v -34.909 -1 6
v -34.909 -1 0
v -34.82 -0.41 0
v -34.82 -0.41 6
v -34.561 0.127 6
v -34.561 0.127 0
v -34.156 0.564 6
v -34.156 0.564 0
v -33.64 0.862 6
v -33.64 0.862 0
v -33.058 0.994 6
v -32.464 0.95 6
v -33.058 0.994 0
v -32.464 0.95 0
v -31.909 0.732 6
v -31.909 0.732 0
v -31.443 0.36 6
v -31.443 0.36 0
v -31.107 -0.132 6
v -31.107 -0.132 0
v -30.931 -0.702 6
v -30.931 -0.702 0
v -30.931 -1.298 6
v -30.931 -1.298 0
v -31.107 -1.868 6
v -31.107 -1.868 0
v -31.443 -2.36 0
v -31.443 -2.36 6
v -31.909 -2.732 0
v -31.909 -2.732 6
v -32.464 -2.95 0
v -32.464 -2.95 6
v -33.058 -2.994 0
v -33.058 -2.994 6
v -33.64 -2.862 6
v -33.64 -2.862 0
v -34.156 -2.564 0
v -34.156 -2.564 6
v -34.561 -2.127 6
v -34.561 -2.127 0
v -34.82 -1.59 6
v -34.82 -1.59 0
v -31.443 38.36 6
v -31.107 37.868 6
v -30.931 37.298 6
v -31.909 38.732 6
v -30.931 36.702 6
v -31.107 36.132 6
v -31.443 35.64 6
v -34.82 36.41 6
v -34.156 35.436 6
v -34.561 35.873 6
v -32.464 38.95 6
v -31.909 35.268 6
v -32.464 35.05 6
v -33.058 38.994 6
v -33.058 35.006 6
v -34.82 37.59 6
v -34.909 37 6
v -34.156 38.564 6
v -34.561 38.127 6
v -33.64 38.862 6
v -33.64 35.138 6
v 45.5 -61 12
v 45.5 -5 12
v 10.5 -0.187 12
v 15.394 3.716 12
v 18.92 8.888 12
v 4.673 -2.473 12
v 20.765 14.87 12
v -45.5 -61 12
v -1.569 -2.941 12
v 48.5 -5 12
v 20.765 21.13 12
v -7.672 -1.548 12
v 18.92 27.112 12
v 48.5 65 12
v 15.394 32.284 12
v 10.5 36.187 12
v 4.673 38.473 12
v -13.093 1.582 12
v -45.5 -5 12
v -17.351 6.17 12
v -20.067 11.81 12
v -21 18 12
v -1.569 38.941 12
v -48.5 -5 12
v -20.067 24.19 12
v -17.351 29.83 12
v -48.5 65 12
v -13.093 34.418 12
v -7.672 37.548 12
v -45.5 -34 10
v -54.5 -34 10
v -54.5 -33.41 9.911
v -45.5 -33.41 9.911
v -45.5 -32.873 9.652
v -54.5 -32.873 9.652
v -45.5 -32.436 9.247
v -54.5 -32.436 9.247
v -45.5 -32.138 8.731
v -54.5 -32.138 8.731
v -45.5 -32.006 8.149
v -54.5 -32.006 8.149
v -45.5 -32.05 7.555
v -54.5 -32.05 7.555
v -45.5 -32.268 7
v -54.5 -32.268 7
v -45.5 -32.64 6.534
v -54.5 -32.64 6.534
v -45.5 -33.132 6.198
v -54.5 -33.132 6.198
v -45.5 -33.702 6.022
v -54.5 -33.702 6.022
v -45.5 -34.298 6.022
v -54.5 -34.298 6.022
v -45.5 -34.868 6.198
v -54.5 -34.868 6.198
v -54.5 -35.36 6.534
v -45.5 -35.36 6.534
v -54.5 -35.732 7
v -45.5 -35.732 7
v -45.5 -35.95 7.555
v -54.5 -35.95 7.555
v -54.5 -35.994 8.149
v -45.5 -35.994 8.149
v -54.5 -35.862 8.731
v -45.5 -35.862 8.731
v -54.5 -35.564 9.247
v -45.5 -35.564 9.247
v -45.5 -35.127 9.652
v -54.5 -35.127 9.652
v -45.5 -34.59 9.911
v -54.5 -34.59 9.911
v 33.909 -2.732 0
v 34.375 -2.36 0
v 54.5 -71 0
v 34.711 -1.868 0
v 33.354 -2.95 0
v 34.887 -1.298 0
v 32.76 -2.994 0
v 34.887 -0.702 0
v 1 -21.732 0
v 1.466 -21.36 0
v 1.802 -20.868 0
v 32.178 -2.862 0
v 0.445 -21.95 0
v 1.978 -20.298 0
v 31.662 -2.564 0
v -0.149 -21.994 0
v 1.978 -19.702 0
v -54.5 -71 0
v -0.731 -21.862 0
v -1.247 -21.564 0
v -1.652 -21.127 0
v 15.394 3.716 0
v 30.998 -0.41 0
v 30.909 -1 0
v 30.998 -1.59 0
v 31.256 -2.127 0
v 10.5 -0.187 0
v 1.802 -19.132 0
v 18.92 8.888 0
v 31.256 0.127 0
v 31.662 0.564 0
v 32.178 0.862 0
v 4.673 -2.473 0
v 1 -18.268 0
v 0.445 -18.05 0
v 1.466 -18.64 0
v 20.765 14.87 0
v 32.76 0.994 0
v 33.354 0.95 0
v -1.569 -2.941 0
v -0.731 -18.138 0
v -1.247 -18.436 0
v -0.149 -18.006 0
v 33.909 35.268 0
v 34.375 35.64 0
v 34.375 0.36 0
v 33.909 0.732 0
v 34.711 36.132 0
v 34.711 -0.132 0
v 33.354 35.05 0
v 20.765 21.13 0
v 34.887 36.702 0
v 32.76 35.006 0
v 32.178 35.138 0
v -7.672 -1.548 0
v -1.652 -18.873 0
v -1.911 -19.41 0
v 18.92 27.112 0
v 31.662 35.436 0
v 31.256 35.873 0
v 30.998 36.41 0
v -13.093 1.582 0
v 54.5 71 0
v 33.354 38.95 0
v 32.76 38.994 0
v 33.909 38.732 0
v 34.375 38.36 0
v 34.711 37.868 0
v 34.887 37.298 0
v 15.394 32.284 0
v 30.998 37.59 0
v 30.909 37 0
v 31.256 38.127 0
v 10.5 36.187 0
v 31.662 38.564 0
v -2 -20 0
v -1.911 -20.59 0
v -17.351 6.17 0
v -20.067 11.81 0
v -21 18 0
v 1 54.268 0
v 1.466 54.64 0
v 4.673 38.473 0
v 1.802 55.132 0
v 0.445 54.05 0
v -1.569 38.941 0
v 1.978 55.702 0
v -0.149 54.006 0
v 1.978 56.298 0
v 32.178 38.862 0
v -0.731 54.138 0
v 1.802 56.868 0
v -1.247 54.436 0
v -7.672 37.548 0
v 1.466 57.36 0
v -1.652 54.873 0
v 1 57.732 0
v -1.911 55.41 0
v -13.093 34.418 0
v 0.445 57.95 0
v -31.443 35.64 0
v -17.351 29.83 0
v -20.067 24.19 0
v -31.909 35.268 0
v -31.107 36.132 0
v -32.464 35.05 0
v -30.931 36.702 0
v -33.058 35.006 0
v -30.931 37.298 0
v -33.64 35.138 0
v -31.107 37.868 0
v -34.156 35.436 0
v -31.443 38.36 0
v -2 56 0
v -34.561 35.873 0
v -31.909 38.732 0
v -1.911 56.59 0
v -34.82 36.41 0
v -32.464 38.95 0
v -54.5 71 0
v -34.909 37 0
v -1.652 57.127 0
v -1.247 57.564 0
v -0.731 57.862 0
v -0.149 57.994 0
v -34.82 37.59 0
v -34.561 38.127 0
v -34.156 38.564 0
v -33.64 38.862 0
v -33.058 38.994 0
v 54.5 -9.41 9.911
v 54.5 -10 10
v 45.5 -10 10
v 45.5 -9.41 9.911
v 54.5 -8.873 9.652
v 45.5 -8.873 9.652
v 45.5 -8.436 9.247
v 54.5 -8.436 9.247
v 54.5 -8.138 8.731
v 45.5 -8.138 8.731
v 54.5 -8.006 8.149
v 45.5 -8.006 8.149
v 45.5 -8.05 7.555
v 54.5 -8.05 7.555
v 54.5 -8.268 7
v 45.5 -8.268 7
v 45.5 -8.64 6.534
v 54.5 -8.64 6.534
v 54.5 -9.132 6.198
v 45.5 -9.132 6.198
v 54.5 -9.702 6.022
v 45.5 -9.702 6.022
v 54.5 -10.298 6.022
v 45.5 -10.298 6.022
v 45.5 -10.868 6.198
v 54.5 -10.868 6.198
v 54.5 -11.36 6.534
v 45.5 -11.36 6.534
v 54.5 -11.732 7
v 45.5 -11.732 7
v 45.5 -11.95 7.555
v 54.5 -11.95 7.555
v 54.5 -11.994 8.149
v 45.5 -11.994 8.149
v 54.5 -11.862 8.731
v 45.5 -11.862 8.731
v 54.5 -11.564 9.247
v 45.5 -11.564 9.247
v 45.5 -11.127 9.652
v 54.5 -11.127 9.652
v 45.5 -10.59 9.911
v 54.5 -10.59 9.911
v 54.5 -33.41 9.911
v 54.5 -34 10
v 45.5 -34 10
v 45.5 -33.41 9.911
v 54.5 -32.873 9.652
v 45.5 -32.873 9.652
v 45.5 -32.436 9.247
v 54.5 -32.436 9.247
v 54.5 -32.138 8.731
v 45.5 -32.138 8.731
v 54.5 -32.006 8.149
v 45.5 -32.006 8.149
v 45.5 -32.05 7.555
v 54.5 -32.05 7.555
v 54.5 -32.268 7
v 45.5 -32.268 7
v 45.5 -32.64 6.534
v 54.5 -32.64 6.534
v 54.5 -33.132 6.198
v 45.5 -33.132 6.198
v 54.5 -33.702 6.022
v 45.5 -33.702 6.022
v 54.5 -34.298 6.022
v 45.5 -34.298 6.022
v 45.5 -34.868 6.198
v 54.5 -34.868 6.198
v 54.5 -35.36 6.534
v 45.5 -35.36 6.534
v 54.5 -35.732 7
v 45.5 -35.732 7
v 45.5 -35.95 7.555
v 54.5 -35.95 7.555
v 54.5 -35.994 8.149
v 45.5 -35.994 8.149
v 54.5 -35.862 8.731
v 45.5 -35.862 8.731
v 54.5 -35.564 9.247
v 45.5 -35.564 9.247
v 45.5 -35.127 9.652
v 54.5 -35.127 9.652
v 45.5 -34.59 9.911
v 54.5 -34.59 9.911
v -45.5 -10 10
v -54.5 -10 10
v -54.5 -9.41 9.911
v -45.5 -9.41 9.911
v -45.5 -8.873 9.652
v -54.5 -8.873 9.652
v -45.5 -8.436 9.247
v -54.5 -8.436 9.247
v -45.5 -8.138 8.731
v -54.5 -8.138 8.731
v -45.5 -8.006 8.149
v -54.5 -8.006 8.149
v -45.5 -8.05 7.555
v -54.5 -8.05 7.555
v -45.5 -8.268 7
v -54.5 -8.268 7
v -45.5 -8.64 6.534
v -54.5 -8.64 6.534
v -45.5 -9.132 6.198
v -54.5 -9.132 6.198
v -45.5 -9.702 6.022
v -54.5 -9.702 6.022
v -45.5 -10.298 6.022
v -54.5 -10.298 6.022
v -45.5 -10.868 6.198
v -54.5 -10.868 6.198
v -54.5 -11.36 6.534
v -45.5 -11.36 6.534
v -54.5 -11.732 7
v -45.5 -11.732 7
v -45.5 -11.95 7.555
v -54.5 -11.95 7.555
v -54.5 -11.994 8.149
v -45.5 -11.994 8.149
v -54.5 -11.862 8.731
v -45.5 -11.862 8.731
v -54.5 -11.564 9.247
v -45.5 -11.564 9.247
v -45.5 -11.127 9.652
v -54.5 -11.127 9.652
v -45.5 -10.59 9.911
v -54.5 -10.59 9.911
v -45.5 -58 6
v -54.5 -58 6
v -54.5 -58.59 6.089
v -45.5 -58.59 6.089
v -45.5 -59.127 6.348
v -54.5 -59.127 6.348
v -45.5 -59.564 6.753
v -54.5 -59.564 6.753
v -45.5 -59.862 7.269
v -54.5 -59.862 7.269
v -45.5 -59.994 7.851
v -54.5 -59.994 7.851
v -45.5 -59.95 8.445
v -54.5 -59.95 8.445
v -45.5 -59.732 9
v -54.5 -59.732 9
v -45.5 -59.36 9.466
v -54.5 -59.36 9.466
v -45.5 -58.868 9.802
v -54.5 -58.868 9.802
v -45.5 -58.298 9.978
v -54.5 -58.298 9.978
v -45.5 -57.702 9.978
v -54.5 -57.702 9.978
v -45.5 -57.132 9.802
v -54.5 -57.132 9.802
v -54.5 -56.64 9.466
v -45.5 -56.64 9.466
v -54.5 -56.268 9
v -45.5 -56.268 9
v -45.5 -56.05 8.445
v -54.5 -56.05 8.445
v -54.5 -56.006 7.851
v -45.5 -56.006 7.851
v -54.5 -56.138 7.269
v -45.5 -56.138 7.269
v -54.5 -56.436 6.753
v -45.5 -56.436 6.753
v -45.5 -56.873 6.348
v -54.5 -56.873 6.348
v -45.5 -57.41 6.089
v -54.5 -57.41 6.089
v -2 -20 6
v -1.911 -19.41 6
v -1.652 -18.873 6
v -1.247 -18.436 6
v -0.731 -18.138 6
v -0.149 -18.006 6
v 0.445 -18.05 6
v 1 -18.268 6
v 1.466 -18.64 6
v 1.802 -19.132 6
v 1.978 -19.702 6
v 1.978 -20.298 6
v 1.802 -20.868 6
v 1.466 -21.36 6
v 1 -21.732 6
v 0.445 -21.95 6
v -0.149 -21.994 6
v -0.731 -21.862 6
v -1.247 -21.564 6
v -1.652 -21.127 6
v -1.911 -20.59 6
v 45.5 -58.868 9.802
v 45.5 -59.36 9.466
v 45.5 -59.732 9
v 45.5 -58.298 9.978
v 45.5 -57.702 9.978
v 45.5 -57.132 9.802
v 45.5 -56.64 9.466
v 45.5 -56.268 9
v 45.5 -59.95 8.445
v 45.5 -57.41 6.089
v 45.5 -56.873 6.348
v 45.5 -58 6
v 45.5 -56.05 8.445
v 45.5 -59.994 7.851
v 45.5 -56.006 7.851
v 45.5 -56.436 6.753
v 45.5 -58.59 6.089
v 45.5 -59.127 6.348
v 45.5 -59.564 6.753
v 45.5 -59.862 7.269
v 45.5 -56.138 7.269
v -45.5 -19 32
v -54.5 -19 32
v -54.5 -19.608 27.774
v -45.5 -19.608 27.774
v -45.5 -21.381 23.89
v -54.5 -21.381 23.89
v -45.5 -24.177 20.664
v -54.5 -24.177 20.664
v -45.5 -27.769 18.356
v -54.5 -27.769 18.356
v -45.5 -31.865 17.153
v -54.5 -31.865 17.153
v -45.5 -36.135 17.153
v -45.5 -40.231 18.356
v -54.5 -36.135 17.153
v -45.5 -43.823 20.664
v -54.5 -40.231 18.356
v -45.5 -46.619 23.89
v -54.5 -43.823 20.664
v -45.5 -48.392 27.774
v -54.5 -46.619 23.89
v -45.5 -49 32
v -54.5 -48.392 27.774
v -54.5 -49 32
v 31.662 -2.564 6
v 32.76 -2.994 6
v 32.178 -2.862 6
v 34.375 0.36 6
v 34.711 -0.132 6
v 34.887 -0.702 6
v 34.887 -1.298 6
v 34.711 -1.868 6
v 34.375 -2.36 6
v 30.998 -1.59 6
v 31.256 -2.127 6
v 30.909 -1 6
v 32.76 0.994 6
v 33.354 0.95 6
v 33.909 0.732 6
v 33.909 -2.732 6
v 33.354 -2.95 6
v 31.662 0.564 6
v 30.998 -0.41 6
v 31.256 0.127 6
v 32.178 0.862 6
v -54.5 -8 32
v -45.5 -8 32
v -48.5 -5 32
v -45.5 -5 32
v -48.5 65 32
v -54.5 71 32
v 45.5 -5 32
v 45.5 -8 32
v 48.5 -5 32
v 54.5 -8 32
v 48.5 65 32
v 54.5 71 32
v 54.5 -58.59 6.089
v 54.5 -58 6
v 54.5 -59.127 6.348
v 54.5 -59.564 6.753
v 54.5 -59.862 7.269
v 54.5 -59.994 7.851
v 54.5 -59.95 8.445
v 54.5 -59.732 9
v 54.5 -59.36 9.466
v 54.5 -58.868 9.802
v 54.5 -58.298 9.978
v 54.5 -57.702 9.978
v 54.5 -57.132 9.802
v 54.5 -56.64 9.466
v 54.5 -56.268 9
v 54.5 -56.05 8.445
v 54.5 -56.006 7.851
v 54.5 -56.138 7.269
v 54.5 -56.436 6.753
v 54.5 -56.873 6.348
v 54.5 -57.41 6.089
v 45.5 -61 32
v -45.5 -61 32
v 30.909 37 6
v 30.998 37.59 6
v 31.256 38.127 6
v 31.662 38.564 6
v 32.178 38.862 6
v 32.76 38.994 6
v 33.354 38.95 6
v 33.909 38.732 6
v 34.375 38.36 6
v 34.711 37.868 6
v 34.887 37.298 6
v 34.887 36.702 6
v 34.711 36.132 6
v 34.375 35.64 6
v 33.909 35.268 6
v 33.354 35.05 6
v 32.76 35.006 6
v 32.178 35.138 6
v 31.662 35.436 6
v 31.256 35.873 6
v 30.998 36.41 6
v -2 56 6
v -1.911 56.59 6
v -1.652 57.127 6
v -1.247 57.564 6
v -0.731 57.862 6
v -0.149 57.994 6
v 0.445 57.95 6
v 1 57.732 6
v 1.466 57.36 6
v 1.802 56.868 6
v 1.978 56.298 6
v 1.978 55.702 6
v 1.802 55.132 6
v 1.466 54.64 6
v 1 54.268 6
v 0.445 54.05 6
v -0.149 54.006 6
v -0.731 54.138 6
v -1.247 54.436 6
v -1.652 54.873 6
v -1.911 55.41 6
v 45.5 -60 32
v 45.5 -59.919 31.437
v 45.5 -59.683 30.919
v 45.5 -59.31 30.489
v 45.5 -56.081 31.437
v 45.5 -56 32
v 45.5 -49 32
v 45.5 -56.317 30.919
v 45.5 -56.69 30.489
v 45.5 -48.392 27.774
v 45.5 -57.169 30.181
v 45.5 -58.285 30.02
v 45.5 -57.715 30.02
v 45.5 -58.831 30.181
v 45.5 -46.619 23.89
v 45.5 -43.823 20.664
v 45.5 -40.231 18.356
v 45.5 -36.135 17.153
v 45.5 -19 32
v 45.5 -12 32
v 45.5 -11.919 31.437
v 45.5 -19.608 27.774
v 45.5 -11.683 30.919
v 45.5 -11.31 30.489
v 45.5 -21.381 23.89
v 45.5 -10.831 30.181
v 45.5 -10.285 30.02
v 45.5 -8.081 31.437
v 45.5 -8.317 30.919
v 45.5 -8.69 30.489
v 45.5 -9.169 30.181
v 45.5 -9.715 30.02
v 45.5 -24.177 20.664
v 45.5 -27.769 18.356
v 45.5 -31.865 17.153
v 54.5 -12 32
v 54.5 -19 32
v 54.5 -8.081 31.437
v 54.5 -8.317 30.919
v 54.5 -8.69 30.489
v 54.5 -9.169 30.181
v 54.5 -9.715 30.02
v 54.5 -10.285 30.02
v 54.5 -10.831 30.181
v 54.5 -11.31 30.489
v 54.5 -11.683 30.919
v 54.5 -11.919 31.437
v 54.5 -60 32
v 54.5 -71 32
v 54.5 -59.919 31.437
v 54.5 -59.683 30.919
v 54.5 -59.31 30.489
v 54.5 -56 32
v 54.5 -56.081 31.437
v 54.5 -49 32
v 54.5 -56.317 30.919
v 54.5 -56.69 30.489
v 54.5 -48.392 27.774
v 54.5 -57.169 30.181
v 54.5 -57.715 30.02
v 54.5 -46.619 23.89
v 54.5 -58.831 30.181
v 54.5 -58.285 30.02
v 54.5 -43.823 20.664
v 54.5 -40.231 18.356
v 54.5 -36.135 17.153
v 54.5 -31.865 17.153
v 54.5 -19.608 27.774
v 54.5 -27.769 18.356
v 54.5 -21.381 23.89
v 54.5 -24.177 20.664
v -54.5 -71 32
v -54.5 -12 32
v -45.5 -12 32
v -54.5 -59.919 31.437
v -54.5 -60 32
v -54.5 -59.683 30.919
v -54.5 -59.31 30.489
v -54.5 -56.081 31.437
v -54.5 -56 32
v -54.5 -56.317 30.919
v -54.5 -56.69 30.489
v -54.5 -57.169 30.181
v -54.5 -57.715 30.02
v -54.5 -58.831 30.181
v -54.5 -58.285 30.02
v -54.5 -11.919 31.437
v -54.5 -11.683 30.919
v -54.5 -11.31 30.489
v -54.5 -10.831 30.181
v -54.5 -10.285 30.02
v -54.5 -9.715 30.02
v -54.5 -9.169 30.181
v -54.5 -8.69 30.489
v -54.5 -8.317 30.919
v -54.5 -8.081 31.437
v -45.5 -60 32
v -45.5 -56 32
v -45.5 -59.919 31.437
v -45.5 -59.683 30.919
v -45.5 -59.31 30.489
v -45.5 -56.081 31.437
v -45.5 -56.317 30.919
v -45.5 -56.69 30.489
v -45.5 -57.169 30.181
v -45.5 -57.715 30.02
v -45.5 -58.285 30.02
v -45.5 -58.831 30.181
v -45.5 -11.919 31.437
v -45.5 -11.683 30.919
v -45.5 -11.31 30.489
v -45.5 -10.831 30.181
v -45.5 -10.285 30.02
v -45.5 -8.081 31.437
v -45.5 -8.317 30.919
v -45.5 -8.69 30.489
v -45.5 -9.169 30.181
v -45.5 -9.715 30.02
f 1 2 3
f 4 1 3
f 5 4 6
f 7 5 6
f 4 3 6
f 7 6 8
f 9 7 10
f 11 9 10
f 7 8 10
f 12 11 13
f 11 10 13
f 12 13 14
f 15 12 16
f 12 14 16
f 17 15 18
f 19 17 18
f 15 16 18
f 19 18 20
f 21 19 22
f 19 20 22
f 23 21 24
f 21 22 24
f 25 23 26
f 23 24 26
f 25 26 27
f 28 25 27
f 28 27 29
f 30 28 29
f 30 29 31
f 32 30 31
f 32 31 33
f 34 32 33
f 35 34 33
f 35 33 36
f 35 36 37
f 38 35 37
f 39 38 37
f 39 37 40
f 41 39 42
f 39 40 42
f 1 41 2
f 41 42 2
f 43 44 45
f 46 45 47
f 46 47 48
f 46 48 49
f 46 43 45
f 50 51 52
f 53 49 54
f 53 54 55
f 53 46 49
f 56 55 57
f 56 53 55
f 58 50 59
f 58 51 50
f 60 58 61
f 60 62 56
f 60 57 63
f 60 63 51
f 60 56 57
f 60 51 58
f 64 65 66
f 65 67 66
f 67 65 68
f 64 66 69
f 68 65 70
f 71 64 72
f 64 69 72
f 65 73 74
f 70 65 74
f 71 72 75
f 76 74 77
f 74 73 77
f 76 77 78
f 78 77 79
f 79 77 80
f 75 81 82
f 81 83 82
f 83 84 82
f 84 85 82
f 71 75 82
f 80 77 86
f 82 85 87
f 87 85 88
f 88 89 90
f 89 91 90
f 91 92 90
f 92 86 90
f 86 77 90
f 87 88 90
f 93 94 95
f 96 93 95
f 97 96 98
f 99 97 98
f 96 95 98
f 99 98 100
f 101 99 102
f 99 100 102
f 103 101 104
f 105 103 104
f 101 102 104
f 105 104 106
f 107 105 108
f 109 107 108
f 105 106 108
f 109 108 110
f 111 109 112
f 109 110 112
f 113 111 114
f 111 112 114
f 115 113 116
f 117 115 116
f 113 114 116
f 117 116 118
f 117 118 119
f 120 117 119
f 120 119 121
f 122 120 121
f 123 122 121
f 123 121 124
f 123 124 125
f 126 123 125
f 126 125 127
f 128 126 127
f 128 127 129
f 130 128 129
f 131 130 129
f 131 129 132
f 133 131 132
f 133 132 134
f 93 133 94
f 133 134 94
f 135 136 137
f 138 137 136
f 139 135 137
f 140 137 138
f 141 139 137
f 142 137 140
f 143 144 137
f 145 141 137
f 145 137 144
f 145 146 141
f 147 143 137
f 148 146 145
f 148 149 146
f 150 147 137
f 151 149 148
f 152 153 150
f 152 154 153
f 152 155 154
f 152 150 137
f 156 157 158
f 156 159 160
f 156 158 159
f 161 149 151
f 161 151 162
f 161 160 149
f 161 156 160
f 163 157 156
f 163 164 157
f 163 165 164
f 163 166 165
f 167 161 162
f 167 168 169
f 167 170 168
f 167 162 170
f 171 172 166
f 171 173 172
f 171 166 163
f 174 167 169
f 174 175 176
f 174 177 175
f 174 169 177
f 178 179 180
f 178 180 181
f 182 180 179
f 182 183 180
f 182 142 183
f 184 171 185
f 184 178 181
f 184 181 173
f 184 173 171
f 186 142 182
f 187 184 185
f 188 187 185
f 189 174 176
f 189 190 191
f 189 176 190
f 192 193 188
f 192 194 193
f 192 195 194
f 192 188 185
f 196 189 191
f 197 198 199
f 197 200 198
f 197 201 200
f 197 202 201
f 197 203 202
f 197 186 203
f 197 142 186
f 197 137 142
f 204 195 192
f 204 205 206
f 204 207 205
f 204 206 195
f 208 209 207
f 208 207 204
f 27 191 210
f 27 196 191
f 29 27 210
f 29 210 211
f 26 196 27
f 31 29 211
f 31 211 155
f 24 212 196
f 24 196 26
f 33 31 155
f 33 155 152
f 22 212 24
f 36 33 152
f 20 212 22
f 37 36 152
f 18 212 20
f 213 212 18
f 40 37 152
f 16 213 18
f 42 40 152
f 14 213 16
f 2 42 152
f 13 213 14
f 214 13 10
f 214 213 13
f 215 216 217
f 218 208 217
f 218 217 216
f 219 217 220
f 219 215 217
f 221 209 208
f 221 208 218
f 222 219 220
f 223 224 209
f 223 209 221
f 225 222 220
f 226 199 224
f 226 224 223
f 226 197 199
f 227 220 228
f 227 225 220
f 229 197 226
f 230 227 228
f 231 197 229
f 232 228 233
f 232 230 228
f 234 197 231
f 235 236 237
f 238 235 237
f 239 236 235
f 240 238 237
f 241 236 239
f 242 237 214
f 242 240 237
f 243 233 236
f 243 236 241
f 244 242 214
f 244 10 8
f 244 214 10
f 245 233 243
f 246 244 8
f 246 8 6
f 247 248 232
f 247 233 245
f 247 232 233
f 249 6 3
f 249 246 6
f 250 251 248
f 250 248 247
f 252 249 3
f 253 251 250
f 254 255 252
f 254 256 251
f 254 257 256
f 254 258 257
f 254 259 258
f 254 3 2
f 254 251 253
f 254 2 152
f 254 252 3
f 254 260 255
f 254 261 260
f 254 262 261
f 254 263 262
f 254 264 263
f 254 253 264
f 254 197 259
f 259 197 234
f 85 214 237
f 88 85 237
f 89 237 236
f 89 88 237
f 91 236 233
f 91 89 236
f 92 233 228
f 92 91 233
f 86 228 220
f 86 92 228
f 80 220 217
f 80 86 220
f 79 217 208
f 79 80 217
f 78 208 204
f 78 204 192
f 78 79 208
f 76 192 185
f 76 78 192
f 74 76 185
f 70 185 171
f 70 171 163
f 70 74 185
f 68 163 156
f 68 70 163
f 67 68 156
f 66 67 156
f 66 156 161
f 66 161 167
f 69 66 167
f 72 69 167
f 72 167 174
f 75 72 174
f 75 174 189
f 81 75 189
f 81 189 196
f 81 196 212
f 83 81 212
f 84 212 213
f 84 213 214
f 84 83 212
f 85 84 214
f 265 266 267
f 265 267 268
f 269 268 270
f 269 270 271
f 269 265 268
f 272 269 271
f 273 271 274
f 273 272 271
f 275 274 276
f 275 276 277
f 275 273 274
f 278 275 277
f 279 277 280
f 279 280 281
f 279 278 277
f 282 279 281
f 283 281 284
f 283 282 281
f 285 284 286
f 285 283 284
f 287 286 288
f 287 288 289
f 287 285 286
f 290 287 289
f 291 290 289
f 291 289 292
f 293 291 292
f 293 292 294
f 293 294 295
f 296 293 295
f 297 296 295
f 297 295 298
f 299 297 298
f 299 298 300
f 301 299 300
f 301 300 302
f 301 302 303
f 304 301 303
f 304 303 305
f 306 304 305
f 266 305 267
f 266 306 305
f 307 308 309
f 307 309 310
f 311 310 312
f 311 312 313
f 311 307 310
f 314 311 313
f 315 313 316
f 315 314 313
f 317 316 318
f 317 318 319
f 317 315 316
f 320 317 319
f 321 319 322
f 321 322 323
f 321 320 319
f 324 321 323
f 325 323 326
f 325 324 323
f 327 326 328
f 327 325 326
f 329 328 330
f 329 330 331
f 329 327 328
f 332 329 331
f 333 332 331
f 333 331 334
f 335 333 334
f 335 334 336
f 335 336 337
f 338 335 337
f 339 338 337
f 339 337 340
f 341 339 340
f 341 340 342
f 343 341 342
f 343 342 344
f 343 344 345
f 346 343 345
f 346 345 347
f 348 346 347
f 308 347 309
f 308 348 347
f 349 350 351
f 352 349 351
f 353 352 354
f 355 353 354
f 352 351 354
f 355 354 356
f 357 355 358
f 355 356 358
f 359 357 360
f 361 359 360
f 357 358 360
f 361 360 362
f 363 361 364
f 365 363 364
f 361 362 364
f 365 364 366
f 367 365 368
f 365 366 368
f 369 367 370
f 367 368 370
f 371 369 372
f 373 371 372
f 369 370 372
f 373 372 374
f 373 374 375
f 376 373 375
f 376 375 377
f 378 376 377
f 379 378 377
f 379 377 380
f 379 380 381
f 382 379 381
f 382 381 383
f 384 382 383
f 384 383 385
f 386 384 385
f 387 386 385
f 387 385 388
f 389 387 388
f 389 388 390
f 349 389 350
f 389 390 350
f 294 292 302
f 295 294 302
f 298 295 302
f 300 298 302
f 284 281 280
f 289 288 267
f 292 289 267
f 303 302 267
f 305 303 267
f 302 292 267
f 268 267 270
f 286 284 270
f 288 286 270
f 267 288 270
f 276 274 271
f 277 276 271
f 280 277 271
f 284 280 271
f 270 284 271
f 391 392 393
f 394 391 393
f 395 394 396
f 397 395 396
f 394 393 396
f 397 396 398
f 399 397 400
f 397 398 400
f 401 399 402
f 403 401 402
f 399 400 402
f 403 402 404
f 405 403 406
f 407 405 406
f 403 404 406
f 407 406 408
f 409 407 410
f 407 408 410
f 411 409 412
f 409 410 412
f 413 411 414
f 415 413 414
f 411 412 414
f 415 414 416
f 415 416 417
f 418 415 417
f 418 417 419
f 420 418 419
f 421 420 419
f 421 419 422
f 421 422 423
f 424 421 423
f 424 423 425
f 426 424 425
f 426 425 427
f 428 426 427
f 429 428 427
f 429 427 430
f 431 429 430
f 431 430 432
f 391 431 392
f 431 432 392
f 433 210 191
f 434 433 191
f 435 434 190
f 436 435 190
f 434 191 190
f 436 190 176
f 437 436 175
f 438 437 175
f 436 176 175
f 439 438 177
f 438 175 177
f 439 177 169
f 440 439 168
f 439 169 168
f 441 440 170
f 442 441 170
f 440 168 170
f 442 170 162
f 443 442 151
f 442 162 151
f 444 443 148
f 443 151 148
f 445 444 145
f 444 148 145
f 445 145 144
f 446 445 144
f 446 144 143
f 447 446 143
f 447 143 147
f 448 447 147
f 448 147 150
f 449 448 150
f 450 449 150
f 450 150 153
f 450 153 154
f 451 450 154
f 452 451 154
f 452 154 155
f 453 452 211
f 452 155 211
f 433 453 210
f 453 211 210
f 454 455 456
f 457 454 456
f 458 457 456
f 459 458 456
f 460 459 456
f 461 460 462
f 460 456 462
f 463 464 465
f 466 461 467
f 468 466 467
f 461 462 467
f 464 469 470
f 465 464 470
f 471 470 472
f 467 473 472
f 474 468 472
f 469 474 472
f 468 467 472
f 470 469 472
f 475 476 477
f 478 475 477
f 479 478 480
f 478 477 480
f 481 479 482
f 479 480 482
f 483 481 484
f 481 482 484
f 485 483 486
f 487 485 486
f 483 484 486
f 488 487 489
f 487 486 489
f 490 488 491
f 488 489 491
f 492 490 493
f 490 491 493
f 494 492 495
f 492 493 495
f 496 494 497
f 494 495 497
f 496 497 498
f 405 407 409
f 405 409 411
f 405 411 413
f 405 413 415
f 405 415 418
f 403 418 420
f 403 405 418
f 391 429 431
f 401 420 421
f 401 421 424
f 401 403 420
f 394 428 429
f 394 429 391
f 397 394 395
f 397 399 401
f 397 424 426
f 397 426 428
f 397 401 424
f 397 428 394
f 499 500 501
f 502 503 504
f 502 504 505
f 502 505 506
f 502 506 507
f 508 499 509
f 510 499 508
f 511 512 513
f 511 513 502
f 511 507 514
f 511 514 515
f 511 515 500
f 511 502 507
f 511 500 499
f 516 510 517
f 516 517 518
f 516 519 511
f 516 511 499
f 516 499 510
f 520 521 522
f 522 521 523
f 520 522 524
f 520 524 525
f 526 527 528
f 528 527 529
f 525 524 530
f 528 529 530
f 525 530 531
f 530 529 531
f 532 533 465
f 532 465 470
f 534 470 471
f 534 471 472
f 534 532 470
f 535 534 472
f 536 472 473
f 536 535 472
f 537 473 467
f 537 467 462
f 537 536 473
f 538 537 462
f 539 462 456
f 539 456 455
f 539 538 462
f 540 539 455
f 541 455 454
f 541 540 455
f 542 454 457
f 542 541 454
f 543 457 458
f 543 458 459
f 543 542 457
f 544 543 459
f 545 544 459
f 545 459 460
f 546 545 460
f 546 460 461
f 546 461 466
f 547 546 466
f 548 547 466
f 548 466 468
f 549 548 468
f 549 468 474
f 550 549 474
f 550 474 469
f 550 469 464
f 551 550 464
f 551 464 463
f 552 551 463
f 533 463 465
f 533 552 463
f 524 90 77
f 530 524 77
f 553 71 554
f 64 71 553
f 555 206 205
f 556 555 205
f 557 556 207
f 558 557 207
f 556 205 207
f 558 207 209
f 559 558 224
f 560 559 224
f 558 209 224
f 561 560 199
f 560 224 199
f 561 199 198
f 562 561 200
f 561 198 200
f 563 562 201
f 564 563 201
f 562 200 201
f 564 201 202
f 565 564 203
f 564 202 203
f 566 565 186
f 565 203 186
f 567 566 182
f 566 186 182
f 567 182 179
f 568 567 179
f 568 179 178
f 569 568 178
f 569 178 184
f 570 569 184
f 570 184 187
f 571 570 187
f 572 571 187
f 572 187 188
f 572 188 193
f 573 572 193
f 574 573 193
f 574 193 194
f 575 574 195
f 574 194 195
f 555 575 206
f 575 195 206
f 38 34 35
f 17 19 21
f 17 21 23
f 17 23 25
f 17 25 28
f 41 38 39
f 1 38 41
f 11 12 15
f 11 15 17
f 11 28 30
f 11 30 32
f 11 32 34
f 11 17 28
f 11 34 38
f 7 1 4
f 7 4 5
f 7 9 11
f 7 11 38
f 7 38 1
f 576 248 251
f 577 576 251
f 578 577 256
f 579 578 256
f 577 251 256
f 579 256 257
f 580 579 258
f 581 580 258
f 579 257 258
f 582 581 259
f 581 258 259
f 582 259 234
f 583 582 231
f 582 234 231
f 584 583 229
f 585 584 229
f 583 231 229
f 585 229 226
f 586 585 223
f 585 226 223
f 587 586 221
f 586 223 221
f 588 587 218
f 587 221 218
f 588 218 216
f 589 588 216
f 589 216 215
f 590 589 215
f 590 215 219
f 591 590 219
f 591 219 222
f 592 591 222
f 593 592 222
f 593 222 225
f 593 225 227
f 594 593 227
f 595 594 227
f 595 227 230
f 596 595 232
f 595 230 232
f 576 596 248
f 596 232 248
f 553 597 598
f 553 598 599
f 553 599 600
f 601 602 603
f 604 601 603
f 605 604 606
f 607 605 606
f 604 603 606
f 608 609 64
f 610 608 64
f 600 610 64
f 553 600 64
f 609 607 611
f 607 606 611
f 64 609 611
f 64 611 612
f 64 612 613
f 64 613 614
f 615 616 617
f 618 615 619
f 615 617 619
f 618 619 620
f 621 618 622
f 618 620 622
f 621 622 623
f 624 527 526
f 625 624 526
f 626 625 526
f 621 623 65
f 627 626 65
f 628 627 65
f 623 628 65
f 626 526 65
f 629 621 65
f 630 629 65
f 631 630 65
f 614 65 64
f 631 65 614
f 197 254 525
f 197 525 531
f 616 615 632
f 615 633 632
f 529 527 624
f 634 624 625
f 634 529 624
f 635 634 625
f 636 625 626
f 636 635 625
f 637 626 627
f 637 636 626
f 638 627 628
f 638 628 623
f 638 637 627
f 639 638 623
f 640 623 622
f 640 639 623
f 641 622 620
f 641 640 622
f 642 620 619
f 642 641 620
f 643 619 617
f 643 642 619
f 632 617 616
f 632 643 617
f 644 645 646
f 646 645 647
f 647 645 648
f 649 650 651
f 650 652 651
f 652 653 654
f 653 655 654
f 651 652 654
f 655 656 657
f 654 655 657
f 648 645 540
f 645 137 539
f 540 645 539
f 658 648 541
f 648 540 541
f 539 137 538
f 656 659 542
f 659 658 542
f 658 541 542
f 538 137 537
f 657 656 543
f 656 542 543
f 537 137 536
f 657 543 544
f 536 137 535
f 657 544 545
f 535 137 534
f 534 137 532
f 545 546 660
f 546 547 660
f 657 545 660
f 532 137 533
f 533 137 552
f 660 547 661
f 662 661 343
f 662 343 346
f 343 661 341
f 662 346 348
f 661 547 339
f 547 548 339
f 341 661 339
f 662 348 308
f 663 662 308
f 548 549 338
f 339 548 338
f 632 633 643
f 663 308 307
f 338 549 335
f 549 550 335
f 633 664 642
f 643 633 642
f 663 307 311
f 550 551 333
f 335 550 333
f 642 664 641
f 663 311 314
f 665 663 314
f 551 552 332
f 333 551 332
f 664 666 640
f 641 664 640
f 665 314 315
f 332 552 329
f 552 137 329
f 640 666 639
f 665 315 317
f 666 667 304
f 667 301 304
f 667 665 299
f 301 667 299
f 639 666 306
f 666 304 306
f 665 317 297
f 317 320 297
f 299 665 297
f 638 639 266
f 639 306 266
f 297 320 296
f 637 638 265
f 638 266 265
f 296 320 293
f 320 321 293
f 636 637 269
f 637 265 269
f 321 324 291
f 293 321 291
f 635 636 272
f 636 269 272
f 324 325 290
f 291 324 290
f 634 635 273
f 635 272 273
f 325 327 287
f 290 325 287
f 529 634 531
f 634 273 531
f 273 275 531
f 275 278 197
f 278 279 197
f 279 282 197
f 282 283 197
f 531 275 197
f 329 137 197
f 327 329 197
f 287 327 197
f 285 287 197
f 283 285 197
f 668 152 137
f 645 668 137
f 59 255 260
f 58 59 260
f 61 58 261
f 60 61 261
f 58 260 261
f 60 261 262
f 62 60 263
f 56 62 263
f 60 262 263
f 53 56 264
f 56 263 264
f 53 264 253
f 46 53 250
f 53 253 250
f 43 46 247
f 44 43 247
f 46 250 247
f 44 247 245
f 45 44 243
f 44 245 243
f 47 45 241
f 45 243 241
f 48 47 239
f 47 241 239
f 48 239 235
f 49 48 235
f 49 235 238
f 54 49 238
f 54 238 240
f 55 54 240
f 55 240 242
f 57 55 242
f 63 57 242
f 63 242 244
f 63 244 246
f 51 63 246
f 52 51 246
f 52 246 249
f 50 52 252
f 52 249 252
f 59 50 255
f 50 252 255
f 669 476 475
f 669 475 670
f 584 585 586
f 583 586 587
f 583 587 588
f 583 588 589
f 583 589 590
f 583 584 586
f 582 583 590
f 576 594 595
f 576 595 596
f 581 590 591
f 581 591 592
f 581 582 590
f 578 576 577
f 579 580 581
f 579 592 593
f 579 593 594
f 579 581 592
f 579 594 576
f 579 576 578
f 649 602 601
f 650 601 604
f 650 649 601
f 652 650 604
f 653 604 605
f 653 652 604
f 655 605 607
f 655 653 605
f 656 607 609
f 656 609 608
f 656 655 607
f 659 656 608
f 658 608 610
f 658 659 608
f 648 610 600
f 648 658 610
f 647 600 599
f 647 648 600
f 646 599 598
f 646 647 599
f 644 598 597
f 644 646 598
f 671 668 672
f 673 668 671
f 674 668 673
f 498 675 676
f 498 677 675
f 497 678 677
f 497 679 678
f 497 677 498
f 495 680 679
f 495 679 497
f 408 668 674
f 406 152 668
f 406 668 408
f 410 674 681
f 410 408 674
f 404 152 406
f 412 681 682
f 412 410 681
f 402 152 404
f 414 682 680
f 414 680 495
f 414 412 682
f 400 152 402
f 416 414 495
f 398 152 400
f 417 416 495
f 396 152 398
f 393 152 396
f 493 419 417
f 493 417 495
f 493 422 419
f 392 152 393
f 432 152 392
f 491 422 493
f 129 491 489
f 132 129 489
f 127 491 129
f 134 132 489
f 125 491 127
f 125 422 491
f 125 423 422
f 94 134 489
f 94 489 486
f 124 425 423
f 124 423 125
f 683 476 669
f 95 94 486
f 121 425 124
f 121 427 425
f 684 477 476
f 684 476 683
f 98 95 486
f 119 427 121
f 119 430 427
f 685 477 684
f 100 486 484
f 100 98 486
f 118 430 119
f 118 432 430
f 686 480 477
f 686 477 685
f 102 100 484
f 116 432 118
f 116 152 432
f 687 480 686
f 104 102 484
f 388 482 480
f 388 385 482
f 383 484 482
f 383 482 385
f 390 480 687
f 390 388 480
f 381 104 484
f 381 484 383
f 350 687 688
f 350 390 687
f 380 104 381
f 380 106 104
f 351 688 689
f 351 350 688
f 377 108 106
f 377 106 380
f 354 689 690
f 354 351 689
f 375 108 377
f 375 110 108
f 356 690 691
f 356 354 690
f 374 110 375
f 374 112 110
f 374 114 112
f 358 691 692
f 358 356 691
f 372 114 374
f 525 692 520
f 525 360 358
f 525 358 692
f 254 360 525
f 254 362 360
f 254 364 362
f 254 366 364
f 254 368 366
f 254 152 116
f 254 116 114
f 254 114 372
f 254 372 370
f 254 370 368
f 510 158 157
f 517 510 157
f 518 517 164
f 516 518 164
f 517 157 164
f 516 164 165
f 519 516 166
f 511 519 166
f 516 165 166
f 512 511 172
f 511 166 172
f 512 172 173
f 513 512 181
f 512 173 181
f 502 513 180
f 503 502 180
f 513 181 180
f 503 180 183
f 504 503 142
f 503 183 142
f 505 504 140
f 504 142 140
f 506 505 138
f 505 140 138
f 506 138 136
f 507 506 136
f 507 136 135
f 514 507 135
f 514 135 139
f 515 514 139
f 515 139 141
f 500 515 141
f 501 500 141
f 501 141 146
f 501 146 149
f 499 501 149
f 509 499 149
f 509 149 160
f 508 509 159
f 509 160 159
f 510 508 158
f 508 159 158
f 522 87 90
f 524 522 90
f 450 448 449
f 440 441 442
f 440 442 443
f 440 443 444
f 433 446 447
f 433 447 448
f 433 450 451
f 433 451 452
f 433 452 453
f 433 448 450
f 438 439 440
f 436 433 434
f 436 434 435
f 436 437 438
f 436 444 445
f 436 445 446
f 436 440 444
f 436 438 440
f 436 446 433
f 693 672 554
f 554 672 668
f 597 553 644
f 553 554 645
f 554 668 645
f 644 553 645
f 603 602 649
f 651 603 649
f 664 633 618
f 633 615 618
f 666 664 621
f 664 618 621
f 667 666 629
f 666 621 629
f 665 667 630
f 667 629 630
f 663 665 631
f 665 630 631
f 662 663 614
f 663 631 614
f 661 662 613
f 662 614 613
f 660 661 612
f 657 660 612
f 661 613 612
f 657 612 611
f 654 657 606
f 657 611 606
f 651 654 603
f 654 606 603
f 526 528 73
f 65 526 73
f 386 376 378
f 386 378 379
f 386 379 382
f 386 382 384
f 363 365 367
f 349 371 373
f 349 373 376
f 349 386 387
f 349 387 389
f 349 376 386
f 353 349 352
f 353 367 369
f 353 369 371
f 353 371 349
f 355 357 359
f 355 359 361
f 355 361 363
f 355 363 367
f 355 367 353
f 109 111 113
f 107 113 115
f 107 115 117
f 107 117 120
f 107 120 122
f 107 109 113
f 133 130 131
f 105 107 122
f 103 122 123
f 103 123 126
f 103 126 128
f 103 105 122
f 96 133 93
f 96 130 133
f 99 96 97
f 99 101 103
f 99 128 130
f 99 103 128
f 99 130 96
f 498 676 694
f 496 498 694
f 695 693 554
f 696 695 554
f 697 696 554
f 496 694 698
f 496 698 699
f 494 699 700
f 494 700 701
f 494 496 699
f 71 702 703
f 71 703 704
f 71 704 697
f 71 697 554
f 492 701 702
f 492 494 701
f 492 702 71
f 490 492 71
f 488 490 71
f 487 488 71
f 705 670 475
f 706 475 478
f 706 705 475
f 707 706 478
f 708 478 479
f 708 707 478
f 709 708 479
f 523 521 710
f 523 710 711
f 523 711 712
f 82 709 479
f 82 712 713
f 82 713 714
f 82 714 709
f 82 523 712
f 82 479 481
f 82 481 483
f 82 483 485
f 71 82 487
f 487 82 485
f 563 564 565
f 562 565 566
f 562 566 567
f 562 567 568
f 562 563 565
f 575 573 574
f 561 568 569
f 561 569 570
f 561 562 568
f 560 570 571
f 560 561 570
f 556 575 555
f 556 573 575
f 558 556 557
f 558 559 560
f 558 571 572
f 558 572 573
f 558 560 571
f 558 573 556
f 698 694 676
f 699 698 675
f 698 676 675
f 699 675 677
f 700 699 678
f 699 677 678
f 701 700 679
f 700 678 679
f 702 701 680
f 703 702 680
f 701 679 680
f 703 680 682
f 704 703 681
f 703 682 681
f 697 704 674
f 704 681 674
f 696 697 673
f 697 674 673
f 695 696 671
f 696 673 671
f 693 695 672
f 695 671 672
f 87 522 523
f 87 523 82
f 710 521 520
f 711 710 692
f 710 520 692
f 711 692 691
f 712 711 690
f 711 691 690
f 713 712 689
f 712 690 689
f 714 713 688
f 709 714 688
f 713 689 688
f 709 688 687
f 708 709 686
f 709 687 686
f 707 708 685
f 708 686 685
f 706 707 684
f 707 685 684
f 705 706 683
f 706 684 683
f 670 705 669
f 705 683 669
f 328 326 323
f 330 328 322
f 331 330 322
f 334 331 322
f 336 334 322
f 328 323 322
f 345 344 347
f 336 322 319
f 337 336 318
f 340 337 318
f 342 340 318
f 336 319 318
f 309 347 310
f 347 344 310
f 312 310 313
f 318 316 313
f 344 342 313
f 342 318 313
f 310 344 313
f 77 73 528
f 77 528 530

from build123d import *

# Parameters (mm, degrees)
SKETCH1_W           = 97
SKETCH1_H           = 130
BOSS_EXTRUDE1_DEPTH = 12
SKETCH9_R           = 32
CUT_EXTRUDE2_DEPTH  = 12
SKETCH11_W          = 109
SKETCH11_H          = 142
SKETCH11_W_2        = 97
SKETCH11_H_2        = 130
BOSS_EXTRUDE4_DEPTH = 32
SKETCH18_W          = 20
SKETCH18_H          = 60
BOSS_EXTRUDE5_DEPTH = 3
SKETCH14_R          = 15
CUT_EXTRUDE5_DEPTH  = 134.962681371
SKETCH20_W          = 91
SKETCH20_H          = 20
BOSS_EXTRUDE6_DEPTH = 4
SKETCH21_R          = 2
CUT_EXTRUDE6_DEPTH  = 9
SKETCH23_R          = 2
CUT_EXTRUDE7_DEPTH  = 6
BOSS_EXTRUDE7_START = -12
SKETCH26_R          = 32
SKETCH26_R_2        = 21
BOSS_EXTRUDE7_DEPTH = 12


with BuildPart() as part:
    # Sketch1 → Boss-Extrude1 (new body)
    with BuildSketch(Plane.XY):
        Rectangle(SKETCH1_W, SKETCH1_H)
    extrude(amount=BOSS_EXTRUDE1_DEPTH)

    # Sketch9 → Cut-Extrude2 (cut)
    with BuildSketch(Plane.XY.offset(12)):
        with Locations((0, 18)):
            Circle(SKETCH9_R)
    extrude(amount=-CUT_EXTRUDE2_DEPTH, mode=Mode.SUBTRACT)

    # Sketch11 → Boss-Extrude4 (add)
    with BuildSketch(Plane.XY):
        Rectangle(SKETCH11_W, SKETCH11_H)
        Rectangle(SKETCH11_W_2, SKETCH11_H_2, mode=Mode.SUBTRACT)
    extrude(amount=BOSS_EXTRUDE4_DEPTH)

    # Sketch18 → Boss-Extrude5 (add)
    with BuildSketch(Plane(origin=(-48.5, 0, 0), x_dir=(0, 0, -1), z_dir=(1, 0, 0))):
        with Locations((-22, -35)):
            Rectangle(SKETCH18_W, SKETCH18_H)
    boss_extrude5 = extrude(amount=BOSS_EXTRUDE5_DEPTH)

    # Mirror1: Boss-Extrude5 across plane
    add(boss_extrude5.mirror(Plane(origin=(0, 0, 0), x_dir=(0, 0, 1), z_dir=(1, 0, 0))))

    # Sketch14 → Cut-Extrude5 (cut, through all)
    with BuildSketch(Plane.ZY.offset(54.5)):
        with Locations((32, -34)):
            Circle(SKETCH14_R)
    extrude(amount=-CUT_EXTRUDE5_DEPTH, mode=Mode.SUBTRACT)

    # Sketch20 → Boss-Extrude6 (add)
    with BuildSketch(Plane(origin=(0, -65, 0), x_dir=(1, 0, 0), z_dir=(0, 1, 0))):
        with Locations((0, -22)):
            Rectangle(SKETCH20_W, SKETCH20_H)
    extrude(amount=BOSS_EXTRUDE6_DEPTH)

    # Sketch21 → Cut-Extrude6 (cut)
    with BuildSketch(Plane.ZY.offset(54.5)):
        with Locations((32, -10)):
            Circle(SKETCH21_R)
        with Locations((8, -10)):
            Circle(SKETCH21_R)
        with Locations((56, -10)):
            Circle(SKETCH21_R)
        with Locations((56, -58)):
            Circle(SKETCH21_R)
        with Locations((32, -58)):
            Circle(SKETCH21_R)
        with Locations(Location((8, -58, 0), (0, 0, 180))):
            Circle(SKETCH21_R)
        with Locations((8, -34)):
            Circle(SKETCH21_R)
    cut_extrude6 = extrude(amount=-CUT_EXTRUDE6_DEPTH, mode=Mode.SUBTRACT)

    # Mirror2: Cut-Extrude6 across plane
    add(cut_extrude6.mirror(Plane(origin=(0, 0, 0), x_dir=(0, 0, 1), z_dir=(1, 0, 0))), mode=Mode.SUBTRACT)

    # Sketch23 → Cut-Extrude7 (cut)
    with BuildSketch(Plane(origin=(0, 0, 0), x_dir=(-1, 0, 0), z_dir=(0, 0, -1))):
        with Locations((0, 56)):
            Circle(SKETCH23_R)
        with Locations((32.908965344, 37)):
            Circle(SKETCH23_R)
        with Locations((32.908965344, -1)):
            Circle(SKETCH23_R)
        with Locations((0, -20)):
            Circle(SKETCH23_R)
        with Locations((-32.908965344, -1)):
            Circle(SKETCH23_R)
        with Locations((-32.908965344, 37)):
            Circle(SKETCH23_R)
    extrude(amount=-CUT_EXTRUDE7_DEPTH, mode=Mode.SUBTRACT)

    # Sketch26 → Boss-Extrude7 (add)
    with BuildSketch(Plane(origin=(0, 0, 0), x_dir=(-1, 0, 0), z_dir=(0, 0, -1)).offset(BOSS_EXTRUDE7_START)):
        with Locations((0, 18)):
            Circle(SKETCH26_R)
        with Locations((0, 18)):
            Circle(SKETCH26_R_2, mode=Mode.SUBTRACT)
    extrude(amount=BOSS_EXTRUDE7_DEPTH)


solid = part.part
